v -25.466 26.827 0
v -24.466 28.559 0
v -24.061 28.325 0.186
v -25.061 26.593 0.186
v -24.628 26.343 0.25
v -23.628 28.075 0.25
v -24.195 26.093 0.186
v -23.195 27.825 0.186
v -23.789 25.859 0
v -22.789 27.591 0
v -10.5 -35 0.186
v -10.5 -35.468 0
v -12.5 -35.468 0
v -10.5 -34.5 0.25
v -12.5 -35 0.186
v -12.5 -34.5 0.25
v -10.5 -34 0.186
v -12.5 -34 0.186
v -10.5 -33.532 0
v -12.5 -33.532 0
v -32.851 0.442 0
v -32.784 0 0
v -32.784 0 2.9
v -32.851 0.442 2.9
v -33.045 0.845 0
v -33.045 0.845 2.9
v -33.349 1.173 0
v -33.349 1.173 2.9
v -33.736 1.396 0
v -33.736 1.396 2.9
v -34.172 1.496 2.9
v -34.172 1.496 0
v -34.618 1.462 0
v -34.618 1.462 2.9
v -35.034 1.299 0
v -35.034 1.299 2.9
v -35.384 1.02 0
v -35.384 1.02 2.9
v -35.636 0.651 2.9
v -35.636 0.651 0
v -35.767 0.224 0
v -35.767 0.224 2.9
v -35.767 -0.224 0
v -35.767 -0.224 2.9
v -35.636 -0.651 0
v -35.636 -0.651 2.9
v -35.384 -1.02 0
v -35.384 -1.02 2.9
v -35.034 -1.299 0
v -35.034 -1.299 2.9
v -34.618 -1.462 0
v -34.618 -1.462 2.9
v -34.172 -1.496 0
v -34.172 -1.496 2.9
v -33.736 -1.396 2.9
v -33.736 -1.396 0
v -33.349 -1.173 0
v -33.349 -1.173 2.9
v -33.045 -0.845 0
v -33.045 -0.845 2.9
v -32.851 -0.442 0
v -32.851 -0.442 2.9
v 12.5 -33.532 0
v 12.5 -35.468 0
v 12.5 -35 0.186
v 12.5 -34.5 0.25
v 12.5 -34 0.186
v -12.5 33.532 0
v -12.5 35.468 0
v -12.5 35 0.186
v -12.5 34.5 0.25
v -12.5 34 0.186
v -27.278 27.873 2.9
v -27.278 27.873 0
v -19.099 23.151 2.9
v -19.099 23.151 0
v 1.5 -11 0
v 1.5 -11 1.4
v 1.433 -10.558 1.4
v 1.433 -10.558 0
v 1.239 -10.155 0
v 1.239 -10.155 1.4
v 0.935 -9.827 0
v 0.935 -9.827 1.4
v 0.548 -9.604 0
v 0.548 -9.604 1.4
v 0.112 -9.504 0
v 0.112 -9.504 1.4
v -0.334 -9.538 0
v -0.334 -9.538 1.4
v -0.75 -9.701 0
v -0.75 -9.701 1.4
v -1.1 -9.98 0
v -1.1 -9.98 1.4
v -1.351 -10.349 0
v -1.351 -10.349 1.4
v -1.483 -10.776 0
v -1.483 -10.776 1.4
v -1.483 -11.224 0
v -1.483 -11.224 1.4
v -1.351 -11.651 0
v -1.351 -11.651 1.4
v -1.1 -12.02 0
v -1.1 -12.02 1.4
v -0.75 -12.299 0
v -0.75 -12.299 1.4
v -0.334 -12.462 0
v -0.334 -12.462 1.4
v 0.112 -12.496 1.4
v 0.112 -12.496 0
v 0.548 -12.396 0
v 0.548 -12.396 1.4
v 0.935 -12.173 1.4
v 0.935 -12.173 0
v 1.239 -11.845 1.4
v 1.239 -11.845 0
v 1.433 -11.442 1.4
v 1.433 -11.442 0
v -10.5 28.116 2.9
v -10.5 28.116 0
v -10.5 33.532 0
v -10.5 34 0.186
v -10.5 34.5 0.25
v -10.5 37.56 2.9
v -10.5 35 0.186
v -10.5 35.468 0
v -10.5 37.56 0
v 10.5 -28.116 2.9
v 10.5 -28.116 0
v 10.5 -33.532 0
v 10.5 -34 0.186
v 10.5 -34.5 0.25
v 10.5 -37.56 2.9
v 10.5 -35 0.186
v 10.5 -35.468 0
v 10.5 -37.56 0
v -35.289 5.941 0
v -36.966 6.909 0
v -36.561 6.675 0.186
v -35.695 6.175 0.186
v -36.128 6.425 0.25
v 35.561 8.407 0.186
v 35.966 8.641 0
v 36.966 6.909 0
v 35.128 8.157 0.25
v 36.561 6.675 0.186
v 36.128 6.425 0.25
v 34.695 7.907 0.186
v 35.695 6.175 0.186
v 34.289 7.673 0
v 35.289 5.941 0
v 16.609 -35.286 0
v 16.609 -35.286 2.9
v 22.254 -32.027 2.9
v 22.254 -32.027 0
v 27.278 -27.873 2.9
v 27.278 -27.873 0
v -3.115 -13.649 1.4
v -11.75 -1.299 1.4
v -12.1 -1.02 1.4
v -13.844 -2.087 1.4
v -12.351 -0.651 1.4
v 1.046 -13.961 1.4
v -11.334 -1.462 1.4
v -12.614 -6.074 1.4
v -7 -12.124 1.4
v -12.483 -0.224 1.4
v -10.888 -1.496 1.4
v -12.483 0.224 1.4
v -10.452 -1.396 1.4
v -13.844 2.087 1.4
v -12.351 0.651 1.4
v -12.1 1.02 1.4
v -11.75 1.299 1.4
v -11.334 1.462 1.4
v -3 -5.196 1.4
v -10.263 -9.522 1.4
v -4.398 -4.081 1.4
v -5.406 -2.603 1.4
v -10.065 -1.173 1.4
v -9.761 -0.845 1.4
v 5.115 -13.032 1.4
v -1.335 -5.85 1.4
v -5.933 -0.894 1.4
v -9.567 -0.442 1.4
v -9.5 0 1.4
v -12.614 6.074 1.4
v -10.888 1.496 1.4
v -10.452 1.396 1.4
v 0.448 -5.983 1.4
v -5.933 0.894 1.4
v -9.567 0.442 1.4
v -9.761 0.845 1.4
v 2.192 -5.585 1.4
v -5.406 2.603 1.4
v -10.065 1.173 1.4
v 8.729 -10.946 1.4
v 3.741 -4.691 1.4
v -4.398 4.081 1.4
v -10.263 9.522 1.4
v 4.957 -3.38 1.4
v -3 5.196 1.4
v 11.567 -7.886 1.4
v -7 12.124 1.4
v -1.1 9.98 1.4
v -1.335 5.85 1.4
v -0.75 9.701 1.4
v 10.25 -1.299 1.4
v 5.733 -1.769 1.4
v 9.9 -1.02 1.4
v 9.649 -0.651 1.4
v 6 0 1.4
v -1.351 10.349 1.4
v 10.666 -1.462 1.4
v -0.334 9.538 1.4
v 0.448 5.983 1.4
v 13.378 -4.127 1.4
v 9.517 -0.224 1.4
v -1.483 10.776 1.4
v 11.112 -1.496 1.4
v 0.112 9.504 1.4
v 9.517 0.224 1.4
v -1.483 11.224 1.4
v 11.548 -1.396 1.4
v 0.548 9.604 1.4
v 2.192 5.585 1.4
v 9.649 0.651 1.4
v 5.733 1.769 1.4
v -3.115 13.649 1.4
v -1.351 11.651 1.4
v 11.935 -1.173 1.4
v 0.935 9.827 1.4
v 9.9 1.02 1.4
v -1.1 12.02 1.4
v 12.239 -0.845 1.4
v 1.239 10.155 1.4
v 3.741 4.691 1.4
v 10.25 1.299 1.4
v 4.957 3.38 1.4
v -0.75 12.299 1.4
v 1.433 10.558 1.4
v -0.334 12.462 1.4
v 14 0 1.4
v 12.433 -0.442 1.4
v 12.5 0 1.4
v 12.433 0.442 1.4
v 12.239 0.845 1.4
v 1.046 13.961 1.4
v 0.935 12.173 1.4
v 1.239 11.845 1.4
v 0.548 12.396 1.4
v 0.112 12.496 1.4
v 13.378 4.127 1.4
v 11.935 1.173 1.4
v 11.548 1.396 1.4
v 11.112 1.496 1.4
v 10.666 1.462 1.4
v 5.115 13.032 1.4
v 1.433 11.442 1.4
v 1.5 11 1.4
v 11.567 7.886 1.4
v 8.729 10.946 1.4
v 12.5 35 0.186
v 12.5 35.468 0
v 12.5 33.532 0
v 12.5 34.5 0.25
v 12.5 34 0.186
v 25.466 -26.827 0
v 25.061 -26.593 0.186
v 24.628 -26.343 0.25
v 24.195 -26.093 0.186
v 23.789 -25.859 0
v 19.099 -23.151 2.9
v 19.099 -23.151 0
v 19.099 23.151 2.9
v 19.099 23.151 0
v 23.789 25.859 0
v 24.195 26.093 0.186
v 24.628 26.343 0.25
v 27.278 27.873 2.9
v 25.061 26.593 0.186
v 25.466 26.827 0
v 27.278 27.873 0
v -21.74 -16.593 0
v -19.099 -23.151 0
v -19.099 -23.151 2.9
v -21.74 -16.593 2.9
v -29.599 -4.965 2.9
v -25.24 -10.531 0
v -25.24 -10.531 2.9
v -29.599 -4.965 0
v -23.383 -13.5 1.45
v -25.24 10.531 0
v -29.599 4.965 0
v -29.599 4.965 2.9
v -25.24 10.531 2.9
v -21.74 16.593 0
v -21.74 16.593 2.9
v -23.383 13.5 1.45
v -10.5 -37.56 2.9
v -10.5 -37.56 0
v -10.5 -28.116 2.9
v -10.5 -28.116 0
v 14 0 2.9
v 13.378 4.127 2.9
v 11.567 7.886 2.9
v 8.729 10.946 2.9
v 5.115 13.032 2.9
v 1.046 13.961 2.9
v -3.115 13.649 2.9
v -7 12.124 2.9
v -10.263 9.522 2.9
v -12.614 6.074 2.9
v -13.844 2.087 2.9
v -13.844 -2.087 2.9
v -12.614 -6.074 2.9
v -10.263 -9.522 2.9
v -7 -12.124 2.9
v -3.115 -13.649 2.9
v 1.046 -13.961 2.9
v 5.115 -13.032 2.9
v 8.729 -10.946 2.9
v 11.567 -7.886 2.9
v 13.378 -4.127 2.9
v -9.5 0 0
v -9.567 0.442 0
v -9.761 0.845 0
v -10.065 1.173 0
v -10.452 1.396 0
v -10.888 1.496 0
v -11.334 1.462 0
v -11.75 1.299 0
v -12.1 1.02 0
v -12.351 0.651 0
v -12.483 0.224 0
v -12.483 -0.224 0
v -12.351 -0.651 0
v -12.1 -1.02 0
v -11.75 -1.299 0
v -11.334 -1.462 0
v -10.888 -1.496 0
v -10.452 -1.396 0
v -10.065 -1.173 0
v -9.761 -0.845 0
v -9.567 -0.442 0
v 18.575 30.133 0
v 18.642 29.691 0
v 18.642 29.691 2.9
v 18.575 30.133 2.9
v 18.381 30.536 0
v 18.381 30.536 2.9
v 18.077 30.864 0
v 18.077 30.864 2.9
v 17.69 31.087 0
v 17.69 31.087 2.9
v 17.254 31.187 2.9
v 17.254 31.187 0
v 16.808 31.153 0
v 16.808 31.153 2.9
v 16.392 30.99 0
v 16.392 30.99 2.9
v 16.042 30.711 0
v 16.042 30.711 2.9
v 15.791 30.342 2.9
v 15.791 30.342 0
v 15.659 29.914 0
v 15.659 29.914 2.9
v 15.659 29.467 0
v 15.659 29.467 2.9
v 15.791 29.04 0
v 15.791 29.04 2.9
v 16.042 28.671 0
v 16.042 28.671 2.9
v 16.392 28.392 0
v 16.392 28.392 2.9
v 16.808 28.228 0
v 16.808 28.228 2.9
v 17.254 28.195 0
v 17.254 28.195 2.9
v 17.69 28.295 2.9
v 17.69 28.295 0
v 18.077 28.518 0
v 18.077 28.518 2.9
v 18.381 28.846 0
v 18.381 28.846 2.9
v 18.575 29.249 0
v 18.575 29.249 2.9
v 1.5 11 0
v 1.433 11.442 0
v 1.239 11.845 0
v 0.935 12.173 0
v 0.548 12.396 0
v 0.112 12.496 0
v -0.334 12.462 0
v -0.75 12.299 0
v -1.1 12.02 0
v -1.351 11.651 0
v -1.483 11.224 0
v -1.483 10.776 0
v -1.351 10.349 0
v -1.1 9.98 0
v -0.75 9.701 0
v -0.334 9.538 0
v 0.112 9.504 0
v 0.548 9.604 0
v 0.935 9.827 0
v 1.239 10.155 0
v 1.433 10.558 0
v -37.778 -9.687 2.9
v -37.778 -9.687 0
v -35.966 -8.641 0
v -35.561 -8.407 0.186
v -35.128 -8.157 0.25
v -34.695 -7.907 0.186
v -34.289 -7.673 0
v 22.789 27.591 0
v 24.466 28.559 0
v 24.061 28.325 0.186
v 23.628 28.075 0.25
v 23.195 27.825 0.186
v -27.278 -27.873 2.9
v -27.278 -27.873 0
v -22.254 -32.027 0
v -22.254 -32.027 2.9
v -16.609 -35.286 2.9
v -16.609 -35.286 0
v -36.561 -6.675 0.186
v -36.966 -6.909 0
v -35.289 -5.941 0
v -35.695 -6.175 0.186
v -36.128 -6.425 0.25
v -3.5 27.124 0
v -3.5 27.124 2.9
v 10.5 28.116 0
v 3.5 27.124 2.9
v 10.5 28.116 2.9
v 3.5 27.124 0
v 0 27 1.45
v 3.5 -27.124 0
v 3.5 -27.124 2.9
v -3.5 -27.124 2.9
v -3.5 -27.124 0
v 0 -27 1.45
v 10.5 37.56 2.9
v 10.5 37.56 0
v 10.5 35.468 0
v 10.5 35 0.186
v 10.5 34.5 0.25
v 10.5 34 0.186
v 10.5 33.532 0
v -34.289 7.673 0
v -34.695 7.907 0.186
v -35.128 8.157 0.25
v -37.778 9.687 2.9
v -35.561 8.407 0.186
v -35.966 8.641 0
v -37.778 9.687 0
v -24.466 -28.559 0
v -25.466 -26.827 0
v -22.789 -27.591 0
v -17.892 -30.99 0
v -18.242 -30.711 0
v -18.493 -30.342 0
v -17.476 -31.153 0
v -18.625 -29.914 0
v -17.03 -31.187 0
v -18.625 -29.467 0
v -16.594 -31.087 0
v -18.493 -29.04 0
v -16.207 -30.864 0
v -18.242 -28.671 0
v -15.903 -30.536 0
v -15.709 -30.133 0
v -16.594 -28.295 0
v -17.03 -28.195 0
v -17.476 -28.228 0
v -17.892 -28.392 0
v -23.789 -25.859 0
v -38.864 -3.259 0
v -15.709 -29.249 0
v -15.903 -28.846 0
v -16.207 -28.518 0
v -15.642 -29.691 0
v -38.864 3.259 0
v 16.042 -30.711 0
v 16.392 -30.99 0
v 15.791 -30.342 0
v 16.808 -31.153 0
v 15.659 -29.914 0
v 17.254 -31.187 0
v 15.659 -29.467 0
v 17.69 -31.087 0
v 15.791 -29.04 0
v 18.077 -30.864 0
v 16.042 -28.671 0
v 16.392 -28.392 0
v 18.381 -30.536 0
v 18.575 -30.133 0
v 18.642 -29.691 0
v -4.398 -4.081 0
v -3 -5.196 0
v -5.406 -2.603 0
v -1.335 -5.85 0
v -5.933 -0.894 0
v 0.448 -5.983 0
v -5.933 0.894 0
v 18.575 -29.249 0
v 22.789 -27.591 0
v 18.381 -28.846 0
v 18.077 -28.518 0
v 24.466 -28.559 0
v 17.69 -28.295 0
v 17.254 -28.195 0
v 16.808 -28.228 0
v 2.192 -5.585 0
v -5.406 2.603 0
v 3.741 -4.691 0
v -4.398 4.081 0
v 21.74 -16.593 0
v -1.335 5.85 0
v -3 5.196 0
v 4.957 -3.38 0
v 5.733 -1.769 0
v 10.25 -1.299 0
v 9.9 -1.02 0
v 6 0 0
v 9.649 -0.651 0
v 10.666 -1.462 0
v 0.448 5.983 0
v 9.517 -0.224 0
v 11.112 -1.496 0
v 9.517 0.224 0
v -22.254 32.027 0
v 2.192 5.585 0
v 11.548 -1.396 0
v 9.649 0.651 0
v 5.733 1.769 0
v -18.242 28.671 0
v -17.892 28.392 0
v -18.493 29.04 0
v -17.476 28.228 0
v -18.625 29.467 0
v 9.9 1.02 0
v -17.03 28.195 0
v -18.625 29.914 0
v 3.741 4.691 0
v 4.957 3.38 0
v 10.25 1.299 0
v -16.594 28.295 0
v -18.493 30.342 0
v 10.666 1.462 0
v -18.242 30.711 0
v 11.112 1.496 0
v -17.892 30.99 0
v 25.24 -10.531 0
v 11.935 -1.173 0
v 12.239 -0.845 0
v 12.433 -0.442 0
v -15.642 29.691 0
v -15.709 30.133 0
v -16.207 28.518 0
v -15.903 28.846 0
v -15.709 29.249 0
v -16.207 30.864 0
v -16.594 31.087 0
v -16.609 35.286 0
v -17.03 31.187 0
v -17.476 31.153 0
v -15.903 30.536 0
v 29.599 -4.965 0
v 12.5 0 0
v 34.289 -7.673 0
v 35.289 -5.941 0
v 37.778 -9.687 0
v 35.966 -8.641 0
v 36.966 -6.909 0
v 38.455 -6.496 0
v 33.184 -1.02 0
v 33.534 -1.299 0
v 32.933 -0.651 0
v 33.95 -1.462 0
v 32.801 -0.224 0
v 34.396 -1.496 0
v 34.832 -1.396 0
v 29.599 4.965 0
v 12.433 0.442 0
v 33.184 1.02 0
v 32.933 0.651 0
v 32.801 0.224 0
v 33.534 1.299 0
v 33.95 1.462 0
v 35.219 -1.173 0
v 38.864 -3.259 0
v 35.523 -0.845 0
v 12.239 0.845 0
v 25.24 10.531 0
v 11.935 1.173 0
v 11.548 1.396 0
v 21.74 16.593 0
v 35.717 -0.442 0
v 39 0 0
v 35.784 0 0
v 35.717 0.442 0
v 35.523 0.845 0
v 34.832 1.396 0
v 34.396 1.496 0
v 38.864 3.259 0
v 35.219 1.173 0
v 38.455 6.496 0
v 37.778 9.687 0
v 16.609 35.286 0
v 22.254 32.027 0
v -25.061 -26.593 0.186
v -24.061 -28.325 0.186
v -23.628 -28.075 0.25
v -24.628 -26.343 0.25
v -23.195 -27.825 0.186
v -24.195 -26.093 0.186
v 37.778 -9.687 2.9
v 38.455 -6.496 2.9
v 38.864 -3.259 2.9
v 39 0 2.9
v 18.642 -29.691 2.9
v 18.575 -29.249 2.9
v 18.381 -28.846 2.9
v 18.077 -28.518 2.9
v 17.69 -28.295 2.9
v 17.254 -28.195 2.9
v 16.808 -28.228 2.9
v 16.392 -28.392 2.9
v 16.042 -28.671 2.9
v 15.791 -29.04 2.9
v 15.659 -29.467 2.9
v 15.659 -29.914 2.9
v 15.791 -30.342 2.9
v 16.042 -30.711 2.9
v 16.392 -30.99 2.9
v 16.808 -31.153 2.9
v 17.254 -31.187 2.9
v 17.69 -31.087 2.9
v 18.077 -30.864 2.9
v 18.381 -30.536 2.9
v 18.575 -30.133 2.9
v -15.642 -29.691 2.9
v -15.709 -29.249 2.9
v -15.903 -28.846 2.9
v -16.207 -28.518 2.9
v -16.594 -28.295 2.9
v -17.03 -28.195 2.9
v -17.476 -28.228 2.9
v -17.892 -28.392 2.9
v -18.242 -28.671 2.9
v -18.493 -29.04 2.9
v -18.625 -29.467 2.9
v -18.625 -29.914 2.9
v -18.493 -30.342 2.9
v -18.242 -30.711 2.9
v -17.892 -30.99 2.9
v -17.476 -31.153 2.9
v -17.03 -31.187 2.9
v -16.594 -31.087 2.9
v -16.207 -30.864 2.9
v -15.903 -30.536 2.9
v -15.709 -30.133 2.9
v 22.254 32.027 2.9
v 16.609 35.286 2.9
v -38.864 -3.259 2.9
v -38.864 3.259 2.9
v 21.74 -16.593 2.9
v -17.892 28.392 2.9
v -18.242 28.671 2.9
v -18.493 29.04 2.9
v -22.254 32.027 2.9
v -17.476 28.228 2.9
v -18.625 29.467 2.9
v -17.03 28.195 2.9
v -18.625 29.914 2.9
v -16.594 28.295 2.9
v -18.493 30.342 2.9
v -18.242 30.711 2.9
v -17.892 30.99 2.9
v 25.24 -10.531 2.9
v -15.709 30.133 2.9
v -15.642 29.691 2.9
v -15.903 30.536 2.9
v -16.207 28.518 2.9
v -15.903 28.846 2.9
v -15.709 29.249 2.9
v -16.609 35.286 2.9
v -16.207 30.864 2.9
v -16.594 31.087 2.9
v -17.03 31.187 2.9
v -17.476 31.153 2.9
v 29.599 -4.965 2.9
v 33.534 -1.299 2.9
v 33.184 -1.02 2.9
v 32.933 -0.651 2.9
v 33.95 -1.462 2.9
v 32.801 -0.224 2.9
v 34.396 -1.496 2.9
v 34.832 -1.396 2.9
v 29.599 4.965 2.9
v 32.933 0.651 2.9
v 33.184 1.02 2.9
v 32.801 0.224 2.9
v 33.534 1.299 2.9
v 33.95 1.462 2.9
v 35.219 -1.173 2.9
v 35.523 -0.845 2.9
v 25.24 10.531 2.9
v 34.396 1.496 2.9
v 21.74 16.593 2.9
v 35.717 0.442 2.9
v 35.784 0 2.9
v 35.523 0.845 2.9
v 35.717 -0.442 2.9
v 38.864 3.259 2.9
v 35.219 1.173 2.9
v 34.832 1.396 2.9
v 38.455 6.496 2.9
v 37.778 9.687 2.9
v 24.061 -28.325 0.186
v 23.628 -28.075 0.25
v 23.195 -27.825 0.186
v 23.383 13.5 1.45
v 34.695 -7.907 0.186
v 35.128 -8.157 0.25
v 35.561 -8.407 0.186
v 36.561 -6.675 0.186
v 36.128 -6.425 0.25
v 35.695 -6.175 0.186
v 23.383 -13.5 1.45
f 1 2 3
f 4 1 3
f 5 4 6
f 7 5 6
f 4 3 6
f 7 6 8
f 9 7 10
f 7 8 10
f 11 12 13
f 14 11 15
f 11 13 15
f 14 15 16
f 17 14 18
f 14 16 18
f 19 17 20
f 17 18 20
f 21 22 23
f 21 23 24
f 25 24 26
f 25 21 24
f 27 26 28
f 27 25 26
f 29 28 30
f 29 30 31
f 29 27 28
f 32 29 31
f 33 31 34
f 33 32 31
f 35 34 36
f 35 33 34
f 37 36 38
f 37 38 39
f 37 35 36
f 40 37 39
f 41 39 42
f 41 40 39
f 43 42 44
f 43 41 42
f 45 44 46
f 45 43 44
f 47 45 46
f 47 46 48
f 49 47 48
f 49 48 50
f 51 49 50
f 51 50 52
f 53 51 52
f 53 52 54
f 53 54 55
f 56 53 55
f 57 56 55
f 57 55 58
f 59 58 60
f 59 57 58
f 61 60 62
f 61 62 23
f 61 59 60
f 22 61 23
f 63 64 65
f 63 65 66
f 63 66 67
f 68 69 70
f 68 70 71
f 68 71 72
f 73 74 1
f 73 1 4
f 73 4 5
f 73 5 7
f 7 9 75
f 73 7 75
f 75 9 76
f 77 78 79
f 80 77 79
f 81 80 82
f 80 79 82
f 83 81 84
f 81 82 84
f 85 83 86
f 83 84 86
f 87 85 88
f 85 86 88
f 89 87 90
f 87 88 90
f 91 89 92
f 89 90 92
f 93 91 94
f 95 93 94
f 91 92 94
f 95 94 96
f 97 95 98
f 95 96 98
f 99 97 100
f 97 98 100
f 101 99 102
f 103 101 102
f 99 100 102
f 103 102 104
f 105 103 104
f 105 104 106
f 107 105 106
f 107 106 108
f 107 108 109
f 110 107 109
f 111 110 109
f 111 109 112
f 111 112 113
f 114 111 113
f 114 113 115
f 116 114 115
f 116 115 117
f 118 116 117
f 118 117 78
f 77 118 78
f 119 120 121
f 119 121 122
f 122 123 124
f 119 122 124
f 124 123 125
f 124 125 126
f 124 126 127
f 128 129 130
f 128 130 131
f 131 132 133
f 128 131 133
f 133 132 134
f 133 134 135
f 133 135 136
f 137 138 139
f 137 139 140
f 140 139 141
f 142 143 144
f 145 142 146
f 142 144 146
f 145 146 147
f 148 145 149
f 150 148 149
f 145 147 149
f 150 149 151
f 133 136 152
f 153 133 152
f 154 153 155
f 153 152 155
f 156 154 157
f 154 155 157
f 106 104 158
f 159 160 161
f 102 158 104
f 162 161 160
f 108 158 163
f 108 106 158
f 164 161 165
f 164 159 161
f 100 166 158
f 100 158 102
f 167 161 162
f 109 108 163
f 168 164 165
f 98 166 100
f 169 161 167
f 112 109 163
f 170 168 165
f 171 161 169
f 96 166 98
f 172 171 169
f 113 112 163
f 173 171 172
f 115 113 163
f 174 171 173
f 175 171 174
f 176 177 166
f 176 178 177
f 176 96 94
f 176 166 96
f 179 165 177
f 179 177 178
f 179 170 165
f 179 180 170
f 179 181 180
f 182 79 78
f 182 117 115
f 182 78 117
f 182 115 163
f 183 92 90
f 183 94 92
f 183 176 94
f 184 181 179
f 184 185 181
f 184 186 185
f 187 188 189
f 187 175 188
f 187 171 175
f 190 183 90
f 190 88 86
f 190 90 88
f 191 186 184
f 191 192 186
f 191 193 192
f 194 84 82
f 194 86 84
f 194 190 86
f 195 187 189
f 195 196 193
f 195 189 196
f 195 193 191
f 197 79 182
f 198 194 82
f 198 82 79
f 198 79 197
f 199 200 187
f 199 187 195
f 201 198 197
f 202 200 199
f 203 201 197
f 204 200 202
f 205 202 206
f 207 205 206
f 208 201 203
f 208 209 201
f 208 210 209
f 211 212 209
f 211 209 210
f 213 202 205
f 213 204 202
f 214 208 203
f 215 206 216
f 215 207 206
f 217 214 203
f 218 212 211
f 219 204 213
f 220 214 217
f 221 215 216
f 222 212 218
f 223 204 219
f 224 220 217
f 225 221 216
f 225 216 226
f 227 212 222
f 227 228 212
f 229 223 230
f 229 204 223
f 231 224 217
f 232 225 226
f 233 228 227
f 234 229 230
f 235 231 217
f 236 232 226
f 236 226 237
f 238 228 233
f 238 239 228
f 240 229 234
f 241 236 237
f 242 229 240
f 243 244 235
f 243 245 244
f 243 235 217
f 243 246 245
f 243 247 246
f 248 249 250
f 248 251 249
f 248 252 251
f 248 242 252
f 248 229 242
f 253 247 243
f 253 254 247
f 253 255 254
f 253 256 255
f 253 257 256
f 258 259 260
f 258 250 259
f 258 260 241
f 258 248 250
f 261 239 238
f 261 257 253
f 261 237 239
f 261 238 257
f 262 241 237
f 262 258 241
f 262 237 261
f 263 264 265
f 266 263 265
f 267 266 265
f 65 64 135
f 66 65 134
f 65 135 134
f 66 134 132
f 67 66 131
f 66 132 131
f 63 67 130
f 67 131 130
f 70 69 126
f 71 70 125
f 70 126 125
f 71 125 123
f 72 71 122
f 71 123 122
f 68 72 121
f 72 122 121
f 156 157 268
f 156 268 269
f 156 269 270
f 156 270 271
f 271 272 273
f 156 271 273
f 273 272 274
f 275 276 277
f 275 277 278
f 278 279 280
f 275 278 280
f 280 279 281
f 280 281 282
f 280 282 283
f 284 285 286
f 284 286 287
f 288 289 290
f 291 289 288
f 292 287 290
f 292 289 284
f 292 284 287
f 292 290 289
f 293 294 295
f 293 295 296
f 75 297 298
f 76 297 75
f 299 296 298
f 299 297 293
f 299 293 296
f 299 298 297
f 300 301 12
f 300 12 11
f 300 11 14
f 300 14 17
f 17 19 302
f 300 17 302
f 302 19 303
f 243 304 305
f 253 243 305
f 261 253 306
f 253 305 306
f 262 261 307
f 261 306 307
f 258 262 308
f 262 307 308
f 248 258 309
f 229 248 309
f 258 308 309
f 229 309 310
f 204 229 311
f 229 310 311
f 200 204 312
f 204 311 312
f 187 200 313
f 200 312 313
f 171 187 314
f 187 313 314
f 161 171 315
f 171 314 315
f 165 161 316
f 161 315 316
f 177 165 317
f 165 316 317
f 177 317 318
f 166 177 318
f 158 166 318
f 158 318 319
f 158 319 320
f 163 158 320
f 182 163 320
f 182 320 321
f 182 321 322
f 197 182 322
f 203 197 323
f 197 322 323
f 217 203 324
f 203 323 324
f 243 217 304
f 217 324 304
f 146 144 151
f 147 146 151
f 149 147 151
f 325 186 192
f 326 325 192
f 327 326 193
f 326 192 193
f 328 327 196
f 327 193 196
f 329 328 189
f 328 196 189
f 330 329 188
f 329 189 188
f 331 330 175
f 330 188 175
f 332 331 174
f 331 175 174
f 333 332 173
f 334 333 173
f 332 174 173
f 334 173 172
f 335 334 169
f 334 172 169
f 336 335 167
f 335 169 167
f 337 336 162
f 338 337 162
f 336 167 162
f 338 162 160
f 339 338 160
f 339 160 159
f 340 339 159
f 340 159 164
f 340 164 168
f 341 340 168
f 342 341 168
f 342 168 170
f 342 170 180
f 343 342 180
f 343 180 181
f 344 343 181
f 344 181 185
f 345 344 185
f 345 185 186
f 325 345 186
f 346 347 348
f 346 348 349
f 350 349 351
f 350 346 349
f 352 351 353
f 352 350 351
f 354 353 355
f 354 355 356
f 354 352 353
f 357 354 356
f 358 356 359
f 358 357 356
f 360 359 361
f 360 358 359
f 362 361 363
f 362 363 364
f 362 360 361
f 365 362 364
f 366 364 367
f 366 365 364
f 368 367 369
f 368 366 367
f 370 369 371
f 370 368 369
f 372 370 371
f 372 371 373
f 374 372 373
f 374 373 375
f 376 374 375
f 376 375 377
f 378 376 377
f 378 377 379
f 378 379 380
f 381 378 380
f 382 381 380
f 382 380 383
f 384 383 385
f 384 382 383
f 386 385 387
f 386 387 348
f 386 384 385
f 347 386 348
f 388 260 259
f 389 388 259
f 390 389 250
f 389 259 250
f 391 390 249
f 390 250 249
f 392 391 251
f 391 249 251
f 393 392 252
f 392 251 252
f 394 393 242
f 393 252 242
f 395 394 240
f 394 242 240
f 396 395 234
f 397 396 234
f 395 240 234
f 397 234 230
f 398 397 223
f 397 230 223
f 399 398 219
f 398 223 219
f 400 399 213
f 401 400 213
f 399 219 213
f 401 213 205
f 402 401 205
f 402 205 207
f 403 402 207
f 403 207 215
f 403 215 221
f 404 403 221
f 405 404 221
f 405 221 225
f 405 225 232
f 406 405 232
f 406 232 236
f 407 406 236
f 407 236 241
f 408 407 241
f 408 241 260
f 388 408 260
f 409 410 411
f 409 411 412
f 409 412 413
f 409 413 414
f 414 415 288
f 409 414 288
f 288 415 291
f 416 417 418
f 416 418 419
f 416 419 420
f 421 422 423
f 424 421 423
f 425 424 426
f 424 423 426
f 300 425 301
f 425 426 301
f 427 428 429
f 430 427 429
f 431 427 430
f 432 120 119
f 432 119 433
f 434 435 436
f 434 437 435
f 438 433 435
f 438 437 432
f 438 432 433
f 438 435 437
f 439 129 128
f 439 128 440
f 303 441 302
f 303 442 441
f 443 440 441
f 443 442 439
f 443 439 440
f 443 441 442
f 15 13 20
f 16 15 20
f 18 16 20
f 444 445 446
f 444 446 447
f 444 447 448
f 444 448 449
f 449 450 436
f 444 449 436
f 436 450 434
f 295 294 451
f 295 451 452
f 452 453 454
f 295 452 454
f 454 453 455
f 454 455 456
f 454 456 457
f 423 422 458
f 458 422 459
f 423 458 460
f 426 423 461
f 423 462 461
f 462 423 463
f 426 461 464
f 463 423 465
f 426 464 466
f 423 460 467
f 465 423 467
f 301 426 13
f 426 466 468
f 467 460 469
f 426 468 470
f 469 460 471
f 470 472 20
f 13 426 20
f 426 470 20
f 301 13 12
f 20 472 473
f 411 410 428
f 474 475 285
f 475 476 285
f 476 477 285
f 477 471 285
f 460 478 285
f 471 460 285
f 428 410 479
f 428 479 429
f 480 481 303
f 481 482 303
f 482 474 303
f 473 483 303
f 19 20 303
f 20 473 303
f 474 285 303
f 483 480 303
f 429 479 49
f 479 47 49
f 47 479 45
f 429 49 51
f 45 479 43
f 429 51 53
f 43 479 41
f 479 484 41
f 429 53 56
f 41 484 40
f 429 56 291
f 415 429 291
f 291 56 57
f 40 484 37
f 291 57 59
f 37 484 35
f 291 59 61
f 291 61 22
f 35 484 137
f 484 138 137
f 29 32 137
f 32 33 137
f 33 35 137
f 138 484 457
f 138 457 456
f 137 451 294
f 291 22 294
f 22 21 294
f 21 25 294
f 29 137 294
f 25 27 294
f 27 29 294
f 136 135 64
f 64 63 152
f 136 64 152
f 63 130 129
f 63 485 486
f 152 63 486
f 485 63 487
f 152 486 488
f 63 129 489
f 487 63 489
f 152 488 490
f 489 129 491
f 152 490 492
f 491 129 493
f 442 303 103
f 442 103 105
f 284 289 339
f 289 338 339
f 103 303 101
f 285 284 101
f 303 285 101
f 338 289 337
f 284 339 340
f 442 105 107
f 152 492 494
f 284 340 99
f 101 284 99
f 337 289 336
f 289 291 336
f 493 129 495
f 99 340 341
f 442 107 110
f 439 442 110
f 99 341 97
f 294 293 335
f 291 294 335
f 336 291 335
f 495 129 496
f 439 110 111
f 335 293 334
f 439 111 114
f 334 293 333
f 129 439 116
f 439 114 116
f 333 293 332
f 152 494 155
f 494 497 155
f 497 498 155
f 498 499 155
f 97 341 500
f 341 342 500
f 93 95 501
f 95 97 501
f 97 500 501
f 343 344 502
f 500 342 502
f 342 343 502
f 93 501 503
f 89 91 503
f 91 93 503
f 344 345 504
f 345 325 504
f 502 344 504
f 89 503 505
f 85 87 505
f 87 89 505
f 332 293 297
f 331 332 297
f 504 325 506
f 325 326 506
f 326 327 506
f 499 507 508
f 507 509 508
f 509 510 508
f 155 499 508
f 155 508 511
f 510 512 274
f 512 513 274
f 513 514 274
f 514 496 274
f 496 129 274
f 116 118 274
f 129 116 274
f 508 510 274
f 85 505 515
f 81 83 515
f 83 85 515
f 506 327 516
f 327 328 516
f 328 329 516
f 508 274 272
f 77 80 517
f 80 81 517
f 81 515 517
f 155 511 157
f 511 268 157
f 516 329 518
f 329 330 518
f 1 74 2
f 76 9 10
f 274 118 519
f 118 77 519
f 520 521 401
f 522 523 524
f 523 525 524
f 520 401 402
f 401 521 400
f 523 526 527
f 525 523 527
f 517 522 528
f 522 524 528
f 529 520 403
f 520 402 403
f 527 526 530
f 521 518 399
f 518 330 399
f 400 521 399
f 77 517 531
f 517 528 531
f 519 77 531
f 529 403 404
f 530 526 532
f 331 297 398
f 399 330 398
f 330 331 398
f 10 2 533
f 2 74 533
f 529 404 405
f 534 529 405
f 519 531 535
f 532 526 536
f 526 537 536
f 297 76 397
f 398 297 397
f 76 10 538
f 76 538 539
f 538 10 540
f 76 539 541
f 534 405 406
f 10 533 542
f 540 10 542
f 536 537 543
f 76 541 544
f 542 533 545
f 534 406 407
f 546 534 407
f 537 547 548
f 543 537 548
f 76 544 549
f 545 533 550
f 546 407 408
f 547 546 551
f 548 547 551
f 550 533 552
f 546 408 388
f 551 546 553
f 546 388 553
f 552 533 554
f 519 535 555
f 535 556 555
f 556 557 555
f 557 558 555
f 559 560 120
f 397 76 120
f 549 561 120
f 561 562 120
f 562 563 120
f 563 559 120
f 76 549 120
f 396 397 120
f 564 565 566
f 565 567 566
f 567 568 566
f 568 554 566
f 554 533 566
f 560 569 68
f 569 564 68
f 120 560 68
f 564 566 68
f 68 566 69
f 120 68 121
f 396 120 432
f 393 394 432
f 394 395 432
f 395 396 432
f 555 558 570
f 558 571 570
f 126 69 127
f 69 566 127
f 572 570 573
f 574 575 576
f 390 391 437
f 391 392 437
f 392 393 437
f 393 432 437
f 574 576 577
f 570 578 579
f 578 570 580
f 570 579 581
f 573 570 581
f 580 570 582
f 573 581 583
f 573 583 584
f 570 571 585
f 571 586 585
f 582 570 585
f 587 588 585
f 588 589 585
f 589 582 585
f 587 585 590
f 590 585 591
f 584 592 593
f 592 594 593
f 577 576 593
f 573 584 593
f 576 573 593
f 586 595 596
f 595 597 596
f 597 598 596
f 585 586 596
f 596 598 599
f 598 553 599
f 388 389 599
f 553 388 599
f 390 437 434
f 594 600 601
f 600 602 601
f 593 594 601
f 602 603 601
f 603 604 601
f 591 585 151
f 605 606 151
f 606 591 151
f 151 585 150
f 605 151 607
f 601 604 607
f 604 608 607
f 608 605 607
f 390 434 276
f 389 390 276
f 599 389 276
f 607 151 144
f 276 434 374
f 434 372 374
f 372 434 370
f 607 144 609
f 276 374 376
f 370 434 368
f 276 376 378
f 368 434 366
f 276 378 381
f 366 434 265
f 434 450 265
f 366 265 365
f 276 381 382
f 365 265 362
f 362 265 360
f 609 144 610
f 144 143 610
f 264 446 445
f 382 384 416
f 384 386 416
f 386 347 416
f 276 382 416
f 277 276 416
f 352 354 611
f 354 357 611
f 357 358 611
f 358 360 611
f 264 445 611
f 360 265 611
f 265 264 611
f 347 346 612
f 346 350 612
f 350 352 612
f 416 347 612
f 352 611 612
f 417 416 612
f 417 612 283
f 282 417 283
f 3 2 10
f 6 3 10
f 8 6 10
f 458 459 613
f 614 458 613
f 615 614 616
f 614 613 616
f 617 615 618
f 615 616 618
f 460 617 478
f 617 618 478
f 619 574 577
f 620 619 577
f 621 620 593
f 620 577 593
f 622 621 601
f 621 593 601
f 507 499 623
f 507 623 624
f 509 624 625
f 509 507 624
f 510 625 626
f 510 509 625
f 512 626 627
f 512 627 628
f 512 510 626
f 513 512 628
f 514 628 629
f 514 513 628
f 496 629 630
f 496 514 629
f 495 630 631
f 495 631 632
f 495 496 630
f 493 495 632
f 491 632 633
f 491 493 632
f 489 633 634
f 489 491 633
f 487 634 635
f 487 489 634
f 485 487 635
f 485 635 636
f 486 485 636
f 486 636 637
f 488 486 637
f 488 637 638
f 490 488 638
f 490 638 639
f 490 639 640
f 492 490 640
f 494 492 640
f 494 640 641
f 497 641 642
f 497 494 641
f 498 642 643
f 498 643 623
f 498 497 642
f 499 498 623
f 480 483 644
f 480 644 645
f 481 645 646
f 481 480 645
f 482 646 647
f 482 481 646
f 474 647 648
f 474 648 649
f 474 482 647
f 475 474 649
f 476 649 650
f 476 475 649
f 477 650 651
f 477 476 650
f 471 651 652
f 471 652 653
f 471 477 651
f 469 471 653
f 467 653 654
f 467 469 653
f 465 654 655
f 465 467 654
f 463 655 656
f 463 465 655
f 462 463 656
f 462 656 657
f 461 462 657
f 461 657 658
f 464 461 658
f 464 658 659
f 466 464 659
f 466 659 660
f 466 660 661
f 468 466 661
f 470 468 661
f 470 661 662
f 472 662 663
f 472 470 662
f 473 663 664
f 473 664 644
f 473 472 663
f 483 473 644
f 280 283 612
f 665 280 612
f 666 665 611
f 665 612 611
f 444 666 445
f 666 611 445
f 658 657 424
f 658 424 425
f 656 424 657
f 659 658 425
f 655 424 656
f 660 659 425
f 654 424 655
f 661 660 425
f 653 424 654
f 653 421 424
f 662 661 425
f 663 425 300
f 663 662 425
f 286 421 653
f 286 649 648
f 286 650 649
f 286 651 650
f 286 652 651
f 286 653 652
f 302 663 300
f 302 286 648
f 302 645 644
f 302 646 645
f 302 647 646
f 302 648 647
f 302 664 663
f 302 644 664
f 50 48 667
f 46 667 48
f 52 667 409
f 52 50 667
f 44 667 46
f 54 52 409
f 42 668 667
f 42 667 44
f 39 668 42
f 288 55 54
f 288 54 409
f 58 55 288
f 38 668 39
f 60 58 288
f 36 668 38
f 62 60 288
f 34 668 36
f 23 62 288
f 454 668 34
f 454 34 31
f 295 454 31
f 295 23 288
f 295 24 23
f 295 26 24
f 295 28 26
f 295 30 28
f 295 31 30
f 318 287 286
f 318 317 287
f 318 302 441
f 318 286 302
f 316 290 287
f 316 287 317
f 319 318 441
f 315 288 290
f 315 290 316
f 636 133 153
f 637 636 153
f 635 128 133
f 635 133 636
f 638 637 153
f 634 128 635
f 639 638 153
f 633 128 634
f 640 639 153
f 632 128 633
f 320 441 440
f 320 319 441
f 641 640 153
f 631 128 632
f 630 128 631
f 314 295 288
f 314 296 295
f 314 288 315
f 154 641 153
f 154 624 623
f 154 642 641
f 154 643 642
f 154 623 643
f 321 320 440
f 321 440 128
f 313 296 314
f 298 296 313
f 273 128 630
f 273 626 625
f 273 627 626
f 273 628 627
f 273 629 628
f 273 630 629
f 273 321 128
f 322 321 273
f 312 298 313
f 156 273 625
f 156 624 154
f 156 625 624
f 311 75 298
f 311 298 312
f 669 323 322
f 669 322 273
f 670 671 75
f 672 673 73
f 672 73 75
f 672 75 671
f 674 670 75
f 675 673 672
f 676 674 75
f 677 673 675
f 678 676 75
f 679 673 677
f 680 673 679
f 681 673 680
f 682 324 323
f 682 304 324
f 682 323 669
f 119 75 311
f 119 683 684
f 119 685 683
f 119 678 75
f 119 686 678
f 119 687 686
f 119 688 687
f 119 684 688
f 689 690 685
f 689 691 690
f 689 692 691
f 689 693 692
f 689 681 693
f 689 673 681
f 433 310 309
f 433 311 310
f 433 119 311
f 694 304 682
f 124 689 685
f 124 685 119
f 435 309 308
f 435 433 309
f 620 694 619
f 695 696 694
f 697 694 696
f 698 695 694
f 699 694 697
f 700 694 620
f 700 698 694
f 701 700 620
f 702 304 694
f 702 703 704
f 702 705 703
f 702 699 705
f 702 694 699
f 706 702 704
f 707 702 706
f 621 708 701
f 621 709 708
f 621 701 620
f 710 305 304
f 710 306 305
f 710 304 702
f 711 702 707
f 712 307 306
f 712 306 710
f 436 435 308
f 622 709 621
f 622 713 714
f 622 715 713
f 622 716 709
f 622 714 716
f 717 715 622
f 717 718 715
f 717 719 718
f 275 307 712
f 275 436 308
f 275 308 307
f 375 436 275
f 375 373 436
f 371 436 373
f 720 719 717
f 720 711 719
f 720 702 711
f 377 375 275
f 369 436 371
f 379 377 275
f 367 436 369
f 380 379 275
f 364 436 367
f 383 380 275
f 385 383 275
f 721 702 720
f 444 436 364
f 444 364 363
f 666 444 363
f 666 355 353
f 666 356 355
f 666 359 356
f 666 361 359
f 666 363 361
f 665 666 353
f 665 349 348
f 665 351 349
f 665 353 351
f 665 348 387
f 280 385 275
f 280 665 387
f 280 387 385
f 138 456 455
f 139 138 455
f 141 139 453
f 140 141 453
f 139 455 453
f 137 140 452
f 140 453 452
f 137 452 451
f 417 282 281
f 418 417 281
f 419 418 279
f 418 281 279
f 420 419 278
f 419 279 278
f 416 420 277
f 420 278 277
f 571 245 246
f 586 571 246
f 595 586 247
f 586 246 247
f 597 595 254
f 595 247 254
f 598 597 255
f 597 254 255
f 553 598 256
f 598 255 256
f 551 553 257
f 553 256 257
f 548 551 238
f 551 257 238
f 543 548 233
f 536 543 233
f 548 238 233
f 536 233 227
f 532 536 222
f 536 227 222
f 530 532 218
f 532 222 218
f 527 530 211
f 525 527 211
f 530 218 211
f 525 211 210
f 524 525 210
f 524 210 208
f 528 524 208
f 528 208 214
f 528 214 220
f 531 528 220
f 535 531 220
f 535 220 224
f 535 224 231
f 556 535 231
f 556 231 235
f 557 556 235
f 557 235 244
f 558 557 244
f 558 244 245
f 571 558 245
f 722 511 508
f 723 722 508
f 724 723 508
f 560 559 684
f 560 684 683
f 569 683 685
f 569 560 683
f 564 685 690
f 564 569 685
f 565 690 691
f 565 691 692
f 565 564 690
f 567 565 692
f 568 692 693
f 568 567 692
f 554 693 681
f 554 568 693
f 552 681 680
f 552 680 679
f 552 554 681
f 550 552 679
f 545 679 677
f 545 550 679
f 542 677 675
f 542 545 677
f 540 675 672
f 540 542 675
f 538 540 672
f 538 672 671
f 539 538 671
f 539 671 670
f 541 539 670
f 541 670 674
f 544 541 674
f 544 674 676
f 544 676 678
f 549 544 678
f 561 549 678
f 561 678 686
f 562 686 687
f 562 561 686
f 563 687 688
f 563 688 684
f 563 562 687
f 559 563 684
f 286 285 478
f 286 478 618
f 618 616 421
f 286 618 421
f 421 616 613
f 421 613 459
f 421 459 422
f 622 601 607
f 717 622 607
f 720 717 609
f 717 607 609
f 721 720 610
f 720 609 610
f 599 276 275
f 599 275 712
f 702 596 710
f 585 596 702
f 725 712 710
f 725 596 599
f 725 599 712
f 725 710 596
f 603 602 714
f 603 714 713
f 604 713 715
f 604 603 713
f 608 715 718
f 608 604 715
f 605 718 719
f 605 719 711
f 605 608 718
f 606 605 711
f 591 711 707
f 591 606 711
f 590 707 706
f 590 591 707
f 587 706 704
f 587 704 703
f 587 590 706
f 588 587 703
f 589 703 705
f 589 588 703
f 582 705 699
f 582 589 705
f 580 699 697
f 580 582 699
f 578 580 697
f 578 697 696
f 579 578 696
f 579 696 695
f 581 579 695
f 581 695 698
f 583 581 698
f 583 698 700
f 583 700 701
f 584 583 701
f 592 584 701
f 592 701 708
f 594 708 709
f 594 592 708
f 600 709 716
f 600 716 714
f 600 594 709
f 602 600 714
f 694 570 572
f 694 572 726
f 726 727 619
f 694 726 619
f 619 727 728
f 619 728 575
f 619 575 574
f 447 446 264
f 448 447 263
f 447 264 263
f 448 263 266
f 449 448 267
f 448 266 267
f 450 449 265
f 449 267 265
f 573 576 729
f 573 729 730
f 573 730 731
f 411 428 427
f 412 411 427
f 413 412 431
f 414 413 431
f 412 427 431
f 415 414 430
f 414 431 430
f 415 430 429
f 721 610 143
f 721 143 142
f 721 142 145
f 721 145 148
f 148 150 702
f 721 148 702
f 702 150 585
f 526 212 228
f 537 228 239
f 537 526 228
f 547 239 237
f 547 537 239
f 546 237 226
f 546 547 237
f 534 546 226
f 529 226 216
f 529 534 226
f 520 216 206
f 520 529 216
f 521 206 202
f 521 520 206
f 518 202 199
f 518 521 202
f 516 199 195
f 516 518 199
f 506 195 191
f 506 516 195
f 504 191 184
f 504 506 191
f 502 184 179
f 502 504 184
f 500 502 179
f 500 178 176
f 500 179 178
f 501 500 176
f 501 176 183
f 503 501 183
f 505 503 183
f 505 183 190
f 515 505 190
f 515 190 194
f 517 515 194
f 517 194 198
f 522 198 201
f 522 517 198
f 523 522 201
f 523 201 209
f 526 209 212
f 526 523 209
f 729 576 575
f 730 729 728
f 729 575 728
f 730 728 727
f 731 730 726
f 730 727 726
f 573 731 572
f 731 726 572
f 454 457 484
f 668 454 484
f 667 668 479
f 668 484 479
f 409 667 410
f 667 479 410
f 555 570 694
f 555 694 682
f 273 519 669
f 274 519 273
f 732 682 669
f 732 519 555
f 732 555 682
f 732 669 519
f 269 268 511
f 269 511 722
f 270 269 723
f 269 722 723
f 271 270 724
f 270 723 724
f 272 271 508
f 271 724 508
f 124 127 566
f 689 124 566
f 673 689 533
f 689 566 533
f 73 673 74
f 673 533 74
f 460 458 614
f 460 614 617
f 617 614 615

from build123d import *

# Parameters (mm, degrees)
CROQUIS2_R              = 1.5
CROQUIS2_R_2            = 6
SALIENTE_EXTRUIR2_DEPTH = 2.9
CROQUIS4_R              = 2
CORTAR_EXTRUIR1_DEPTH   = 12.5
MATRIZC1_COUNT          = 6
CROQUIS5_R              = 1.5
CORTAR_EXTRUIR2_DEPTH   = 10
CROQUIS6_R              = 14
CORTAR_EXTRUIR3_DEPTH   = 1.5


with BuildPart() as part:
    # Croquis2 → Saliente-Extruir2 (new body)
    with BuildSketch(Plane.XY):
        with BuildLine():
            Line((-10.5, 28.115792599), (-10.5, 37.559952077))
            ThreePointArc((-10.5, 37.559952077), (-19.5, 33.774990748), (-27.277872663, 27.873242778))
            Line((-27.277872663, 27.873242778), (-19.098990638, 23.151163039))
            add(Edge.make_bspline(
                [(-29.598990638, 4.96462956), (-22.416381166, 12.9421037), (-19.098990638, 23.151163039)],
                knots=[0, 0, 0, 1, 1, 1], degree=2))
            Line((-29.598990638, 4.96462956), (-37.777872663, 9.686709299))
            ThreePointArc((-37.777872663, 9.686709299), (-39, 0), (-37.777872663, -9.686709299))
            Line((-37.777872663, -9.686709299), (-29.598990638, -4.96462956))
            add(Edge.make_bspline(
                [(-19.098990638, -23.151163039), (-22.416381166, -12.9421037), (-29.598990638, -4.96462956)],
                knots=[0, 0, 0, 1, 1, 1], degree=2))
            Line((-19.098990638, -23.151163039), (-27.277872663, -27.873242778))
            ThreePointArc((-27.277872663, -27.873242778), (-19.5, -33.774990748), (-10.5, -37.559952077))
            Line((-10.5, -37.559952077), (-10.5, -28.115792599))
            add(Edge.make_bspline(
                [(10.5, -28.115792599), (0, -25.884207401), (-10.5, -28.115792599)],
                knots=[0, 0, 0, 1, 1, 1], degree=2))
            Line((10.5, -28.115792599), (10.5, -37.559952077))
            ThreePointArc((10.5, -37.559952077), (19.5, -33.774990748), (27.277872663, -27.873242778))
            Line((27.277872663, -27.873242778), (19.098990638, -23.151163039))
            add(Edge.make_bspline(
                [(29.598990638, -4.96462956), (22.416381166, -12.9421037), (19.098990638, -23.151163039)],
                knots=[0, 0, 0, 1, 1, 1], degree=2))
            Line((29.598990638, -4.96462956), (37.777872663, -9.686709299))
            ThreePointArc((37.777872663, -9.686709299), (38.693261906, -4.88175), (39, 0))
            ThreePointArc((39, 0), (38.693261906, 4.88175), (37.777872663, 9.686709299))
            Line((37.777872663, 9.686709299), (29.598990638, 4.96462956))
            add(Edge.make_bspline(
                [(19.098990638, 23.151163039), (22.416381166, 12.9421037), (29.598990638, 4.96462956)],
                knots=[0, 0, 0, 1, 1, 1], degree=2))
            Line((19.098990638, 23.151163039), (27.277872663, 27.873242778))
            ThreePointArc((27.277872663, 27.873242778), (19.5, 33.774990748), (10.5, 37.559952077))
            Line((10.5, 37.559952077), (10.5, 28.115792599))
            add(Edge.make_bspline(
                [(-10.5, 28.115792599), (0, 25.884207401), (10.5, 28.115792599)],
                knots=[0, 0, 0, 1, 1, 1], degree=2))
        make_face()
        with Locations((-17.142037335, -29.69087961)):
            Circle(CROQUIS2_R, mode=Mode.SUBTRACT)
        with Locations((-34.28407467, 0)):
            Circle(CROQUIS2_R, mode=Mode.SUBTRACT)
        with Locations((17.142037335, -29.69087961)):
            Circle(CROQUIS2_R, mode=Mode.SUBTRACT)
        with Locations((-17.142037335, 29.69087961)):
            Circle(CROQUIS2_R, mode=Mode.SUBTRACT)
        Circle(CROQUIS2_R_2, mode=Mode.SUBTRACT)
        with Locations((34.28407467, 0)):
            Circle(CROQUIS2_R, mode=Mode.SUBTRACT)
        with Locations((17.142037335, 29.69087961)):
            Circle(CROQUIS2_R, mode=Mode.SUBTRACT)
    extrude(amount=SALIENTE_EXTRUIR2_DEPTH)

    # Croquis4 → Cortar-Extruir1 (cut, symmetric)
    with BuildSketch(Plane(origin=(0, 0, 0), x_dir=(0, 0, -1), z_dir=(1, 0, 0))):
        with Locations((1.75, 34.5)):
            Circle(CROQUIS4_R)
    cortar_extruir1 = extrude(amount=CORTAR_EXTRUIR1_DEPTH, both=True, mode=Mode.SUBTRACT)

    # MatrizC1: Cortar-Extruir1 ×6 about axis
    matrizc1_axis = Axis((0, 0, 0), (0, 0, 1))
    for i in range(1, MATRIZC1_COUNT):
        add(cortar_extruir1.rotate(matrizc1_axis, i * 360 / MATRIZC1_COUNT), mode=Mode.SUBTRACT)

    # Croquis5 → Cortar-Extruir2 (cut)
    with BuildSketch(Plane.XY.offset(2.9)):
        with Locations((11, 0)):
            Circle(CROQUIS5_R)
        with Locations((0, -11)):
            Circle(CROQUIS5_R)
        with Locations((-11, 0)):
            Circle(CROQUIS5_R)
        with Locations((0, 11)):
            Circle(CROQUIS5_R)
    extrude(amount=-CORTAR_EXTRUIR2_DEPTH, mode=Mode.SUBTRACT)

    # Croquis6 → Cortar-Extruir3 (cut)
    with BuildSketch(Plane.XY.offset(2.9)):
        Circle(CROQUIS6_R)
    extrude(amount=-CORTAR_EXTRUIR3_DEPTH, mode=Mode.SUBTRACT)


solid = part.part
